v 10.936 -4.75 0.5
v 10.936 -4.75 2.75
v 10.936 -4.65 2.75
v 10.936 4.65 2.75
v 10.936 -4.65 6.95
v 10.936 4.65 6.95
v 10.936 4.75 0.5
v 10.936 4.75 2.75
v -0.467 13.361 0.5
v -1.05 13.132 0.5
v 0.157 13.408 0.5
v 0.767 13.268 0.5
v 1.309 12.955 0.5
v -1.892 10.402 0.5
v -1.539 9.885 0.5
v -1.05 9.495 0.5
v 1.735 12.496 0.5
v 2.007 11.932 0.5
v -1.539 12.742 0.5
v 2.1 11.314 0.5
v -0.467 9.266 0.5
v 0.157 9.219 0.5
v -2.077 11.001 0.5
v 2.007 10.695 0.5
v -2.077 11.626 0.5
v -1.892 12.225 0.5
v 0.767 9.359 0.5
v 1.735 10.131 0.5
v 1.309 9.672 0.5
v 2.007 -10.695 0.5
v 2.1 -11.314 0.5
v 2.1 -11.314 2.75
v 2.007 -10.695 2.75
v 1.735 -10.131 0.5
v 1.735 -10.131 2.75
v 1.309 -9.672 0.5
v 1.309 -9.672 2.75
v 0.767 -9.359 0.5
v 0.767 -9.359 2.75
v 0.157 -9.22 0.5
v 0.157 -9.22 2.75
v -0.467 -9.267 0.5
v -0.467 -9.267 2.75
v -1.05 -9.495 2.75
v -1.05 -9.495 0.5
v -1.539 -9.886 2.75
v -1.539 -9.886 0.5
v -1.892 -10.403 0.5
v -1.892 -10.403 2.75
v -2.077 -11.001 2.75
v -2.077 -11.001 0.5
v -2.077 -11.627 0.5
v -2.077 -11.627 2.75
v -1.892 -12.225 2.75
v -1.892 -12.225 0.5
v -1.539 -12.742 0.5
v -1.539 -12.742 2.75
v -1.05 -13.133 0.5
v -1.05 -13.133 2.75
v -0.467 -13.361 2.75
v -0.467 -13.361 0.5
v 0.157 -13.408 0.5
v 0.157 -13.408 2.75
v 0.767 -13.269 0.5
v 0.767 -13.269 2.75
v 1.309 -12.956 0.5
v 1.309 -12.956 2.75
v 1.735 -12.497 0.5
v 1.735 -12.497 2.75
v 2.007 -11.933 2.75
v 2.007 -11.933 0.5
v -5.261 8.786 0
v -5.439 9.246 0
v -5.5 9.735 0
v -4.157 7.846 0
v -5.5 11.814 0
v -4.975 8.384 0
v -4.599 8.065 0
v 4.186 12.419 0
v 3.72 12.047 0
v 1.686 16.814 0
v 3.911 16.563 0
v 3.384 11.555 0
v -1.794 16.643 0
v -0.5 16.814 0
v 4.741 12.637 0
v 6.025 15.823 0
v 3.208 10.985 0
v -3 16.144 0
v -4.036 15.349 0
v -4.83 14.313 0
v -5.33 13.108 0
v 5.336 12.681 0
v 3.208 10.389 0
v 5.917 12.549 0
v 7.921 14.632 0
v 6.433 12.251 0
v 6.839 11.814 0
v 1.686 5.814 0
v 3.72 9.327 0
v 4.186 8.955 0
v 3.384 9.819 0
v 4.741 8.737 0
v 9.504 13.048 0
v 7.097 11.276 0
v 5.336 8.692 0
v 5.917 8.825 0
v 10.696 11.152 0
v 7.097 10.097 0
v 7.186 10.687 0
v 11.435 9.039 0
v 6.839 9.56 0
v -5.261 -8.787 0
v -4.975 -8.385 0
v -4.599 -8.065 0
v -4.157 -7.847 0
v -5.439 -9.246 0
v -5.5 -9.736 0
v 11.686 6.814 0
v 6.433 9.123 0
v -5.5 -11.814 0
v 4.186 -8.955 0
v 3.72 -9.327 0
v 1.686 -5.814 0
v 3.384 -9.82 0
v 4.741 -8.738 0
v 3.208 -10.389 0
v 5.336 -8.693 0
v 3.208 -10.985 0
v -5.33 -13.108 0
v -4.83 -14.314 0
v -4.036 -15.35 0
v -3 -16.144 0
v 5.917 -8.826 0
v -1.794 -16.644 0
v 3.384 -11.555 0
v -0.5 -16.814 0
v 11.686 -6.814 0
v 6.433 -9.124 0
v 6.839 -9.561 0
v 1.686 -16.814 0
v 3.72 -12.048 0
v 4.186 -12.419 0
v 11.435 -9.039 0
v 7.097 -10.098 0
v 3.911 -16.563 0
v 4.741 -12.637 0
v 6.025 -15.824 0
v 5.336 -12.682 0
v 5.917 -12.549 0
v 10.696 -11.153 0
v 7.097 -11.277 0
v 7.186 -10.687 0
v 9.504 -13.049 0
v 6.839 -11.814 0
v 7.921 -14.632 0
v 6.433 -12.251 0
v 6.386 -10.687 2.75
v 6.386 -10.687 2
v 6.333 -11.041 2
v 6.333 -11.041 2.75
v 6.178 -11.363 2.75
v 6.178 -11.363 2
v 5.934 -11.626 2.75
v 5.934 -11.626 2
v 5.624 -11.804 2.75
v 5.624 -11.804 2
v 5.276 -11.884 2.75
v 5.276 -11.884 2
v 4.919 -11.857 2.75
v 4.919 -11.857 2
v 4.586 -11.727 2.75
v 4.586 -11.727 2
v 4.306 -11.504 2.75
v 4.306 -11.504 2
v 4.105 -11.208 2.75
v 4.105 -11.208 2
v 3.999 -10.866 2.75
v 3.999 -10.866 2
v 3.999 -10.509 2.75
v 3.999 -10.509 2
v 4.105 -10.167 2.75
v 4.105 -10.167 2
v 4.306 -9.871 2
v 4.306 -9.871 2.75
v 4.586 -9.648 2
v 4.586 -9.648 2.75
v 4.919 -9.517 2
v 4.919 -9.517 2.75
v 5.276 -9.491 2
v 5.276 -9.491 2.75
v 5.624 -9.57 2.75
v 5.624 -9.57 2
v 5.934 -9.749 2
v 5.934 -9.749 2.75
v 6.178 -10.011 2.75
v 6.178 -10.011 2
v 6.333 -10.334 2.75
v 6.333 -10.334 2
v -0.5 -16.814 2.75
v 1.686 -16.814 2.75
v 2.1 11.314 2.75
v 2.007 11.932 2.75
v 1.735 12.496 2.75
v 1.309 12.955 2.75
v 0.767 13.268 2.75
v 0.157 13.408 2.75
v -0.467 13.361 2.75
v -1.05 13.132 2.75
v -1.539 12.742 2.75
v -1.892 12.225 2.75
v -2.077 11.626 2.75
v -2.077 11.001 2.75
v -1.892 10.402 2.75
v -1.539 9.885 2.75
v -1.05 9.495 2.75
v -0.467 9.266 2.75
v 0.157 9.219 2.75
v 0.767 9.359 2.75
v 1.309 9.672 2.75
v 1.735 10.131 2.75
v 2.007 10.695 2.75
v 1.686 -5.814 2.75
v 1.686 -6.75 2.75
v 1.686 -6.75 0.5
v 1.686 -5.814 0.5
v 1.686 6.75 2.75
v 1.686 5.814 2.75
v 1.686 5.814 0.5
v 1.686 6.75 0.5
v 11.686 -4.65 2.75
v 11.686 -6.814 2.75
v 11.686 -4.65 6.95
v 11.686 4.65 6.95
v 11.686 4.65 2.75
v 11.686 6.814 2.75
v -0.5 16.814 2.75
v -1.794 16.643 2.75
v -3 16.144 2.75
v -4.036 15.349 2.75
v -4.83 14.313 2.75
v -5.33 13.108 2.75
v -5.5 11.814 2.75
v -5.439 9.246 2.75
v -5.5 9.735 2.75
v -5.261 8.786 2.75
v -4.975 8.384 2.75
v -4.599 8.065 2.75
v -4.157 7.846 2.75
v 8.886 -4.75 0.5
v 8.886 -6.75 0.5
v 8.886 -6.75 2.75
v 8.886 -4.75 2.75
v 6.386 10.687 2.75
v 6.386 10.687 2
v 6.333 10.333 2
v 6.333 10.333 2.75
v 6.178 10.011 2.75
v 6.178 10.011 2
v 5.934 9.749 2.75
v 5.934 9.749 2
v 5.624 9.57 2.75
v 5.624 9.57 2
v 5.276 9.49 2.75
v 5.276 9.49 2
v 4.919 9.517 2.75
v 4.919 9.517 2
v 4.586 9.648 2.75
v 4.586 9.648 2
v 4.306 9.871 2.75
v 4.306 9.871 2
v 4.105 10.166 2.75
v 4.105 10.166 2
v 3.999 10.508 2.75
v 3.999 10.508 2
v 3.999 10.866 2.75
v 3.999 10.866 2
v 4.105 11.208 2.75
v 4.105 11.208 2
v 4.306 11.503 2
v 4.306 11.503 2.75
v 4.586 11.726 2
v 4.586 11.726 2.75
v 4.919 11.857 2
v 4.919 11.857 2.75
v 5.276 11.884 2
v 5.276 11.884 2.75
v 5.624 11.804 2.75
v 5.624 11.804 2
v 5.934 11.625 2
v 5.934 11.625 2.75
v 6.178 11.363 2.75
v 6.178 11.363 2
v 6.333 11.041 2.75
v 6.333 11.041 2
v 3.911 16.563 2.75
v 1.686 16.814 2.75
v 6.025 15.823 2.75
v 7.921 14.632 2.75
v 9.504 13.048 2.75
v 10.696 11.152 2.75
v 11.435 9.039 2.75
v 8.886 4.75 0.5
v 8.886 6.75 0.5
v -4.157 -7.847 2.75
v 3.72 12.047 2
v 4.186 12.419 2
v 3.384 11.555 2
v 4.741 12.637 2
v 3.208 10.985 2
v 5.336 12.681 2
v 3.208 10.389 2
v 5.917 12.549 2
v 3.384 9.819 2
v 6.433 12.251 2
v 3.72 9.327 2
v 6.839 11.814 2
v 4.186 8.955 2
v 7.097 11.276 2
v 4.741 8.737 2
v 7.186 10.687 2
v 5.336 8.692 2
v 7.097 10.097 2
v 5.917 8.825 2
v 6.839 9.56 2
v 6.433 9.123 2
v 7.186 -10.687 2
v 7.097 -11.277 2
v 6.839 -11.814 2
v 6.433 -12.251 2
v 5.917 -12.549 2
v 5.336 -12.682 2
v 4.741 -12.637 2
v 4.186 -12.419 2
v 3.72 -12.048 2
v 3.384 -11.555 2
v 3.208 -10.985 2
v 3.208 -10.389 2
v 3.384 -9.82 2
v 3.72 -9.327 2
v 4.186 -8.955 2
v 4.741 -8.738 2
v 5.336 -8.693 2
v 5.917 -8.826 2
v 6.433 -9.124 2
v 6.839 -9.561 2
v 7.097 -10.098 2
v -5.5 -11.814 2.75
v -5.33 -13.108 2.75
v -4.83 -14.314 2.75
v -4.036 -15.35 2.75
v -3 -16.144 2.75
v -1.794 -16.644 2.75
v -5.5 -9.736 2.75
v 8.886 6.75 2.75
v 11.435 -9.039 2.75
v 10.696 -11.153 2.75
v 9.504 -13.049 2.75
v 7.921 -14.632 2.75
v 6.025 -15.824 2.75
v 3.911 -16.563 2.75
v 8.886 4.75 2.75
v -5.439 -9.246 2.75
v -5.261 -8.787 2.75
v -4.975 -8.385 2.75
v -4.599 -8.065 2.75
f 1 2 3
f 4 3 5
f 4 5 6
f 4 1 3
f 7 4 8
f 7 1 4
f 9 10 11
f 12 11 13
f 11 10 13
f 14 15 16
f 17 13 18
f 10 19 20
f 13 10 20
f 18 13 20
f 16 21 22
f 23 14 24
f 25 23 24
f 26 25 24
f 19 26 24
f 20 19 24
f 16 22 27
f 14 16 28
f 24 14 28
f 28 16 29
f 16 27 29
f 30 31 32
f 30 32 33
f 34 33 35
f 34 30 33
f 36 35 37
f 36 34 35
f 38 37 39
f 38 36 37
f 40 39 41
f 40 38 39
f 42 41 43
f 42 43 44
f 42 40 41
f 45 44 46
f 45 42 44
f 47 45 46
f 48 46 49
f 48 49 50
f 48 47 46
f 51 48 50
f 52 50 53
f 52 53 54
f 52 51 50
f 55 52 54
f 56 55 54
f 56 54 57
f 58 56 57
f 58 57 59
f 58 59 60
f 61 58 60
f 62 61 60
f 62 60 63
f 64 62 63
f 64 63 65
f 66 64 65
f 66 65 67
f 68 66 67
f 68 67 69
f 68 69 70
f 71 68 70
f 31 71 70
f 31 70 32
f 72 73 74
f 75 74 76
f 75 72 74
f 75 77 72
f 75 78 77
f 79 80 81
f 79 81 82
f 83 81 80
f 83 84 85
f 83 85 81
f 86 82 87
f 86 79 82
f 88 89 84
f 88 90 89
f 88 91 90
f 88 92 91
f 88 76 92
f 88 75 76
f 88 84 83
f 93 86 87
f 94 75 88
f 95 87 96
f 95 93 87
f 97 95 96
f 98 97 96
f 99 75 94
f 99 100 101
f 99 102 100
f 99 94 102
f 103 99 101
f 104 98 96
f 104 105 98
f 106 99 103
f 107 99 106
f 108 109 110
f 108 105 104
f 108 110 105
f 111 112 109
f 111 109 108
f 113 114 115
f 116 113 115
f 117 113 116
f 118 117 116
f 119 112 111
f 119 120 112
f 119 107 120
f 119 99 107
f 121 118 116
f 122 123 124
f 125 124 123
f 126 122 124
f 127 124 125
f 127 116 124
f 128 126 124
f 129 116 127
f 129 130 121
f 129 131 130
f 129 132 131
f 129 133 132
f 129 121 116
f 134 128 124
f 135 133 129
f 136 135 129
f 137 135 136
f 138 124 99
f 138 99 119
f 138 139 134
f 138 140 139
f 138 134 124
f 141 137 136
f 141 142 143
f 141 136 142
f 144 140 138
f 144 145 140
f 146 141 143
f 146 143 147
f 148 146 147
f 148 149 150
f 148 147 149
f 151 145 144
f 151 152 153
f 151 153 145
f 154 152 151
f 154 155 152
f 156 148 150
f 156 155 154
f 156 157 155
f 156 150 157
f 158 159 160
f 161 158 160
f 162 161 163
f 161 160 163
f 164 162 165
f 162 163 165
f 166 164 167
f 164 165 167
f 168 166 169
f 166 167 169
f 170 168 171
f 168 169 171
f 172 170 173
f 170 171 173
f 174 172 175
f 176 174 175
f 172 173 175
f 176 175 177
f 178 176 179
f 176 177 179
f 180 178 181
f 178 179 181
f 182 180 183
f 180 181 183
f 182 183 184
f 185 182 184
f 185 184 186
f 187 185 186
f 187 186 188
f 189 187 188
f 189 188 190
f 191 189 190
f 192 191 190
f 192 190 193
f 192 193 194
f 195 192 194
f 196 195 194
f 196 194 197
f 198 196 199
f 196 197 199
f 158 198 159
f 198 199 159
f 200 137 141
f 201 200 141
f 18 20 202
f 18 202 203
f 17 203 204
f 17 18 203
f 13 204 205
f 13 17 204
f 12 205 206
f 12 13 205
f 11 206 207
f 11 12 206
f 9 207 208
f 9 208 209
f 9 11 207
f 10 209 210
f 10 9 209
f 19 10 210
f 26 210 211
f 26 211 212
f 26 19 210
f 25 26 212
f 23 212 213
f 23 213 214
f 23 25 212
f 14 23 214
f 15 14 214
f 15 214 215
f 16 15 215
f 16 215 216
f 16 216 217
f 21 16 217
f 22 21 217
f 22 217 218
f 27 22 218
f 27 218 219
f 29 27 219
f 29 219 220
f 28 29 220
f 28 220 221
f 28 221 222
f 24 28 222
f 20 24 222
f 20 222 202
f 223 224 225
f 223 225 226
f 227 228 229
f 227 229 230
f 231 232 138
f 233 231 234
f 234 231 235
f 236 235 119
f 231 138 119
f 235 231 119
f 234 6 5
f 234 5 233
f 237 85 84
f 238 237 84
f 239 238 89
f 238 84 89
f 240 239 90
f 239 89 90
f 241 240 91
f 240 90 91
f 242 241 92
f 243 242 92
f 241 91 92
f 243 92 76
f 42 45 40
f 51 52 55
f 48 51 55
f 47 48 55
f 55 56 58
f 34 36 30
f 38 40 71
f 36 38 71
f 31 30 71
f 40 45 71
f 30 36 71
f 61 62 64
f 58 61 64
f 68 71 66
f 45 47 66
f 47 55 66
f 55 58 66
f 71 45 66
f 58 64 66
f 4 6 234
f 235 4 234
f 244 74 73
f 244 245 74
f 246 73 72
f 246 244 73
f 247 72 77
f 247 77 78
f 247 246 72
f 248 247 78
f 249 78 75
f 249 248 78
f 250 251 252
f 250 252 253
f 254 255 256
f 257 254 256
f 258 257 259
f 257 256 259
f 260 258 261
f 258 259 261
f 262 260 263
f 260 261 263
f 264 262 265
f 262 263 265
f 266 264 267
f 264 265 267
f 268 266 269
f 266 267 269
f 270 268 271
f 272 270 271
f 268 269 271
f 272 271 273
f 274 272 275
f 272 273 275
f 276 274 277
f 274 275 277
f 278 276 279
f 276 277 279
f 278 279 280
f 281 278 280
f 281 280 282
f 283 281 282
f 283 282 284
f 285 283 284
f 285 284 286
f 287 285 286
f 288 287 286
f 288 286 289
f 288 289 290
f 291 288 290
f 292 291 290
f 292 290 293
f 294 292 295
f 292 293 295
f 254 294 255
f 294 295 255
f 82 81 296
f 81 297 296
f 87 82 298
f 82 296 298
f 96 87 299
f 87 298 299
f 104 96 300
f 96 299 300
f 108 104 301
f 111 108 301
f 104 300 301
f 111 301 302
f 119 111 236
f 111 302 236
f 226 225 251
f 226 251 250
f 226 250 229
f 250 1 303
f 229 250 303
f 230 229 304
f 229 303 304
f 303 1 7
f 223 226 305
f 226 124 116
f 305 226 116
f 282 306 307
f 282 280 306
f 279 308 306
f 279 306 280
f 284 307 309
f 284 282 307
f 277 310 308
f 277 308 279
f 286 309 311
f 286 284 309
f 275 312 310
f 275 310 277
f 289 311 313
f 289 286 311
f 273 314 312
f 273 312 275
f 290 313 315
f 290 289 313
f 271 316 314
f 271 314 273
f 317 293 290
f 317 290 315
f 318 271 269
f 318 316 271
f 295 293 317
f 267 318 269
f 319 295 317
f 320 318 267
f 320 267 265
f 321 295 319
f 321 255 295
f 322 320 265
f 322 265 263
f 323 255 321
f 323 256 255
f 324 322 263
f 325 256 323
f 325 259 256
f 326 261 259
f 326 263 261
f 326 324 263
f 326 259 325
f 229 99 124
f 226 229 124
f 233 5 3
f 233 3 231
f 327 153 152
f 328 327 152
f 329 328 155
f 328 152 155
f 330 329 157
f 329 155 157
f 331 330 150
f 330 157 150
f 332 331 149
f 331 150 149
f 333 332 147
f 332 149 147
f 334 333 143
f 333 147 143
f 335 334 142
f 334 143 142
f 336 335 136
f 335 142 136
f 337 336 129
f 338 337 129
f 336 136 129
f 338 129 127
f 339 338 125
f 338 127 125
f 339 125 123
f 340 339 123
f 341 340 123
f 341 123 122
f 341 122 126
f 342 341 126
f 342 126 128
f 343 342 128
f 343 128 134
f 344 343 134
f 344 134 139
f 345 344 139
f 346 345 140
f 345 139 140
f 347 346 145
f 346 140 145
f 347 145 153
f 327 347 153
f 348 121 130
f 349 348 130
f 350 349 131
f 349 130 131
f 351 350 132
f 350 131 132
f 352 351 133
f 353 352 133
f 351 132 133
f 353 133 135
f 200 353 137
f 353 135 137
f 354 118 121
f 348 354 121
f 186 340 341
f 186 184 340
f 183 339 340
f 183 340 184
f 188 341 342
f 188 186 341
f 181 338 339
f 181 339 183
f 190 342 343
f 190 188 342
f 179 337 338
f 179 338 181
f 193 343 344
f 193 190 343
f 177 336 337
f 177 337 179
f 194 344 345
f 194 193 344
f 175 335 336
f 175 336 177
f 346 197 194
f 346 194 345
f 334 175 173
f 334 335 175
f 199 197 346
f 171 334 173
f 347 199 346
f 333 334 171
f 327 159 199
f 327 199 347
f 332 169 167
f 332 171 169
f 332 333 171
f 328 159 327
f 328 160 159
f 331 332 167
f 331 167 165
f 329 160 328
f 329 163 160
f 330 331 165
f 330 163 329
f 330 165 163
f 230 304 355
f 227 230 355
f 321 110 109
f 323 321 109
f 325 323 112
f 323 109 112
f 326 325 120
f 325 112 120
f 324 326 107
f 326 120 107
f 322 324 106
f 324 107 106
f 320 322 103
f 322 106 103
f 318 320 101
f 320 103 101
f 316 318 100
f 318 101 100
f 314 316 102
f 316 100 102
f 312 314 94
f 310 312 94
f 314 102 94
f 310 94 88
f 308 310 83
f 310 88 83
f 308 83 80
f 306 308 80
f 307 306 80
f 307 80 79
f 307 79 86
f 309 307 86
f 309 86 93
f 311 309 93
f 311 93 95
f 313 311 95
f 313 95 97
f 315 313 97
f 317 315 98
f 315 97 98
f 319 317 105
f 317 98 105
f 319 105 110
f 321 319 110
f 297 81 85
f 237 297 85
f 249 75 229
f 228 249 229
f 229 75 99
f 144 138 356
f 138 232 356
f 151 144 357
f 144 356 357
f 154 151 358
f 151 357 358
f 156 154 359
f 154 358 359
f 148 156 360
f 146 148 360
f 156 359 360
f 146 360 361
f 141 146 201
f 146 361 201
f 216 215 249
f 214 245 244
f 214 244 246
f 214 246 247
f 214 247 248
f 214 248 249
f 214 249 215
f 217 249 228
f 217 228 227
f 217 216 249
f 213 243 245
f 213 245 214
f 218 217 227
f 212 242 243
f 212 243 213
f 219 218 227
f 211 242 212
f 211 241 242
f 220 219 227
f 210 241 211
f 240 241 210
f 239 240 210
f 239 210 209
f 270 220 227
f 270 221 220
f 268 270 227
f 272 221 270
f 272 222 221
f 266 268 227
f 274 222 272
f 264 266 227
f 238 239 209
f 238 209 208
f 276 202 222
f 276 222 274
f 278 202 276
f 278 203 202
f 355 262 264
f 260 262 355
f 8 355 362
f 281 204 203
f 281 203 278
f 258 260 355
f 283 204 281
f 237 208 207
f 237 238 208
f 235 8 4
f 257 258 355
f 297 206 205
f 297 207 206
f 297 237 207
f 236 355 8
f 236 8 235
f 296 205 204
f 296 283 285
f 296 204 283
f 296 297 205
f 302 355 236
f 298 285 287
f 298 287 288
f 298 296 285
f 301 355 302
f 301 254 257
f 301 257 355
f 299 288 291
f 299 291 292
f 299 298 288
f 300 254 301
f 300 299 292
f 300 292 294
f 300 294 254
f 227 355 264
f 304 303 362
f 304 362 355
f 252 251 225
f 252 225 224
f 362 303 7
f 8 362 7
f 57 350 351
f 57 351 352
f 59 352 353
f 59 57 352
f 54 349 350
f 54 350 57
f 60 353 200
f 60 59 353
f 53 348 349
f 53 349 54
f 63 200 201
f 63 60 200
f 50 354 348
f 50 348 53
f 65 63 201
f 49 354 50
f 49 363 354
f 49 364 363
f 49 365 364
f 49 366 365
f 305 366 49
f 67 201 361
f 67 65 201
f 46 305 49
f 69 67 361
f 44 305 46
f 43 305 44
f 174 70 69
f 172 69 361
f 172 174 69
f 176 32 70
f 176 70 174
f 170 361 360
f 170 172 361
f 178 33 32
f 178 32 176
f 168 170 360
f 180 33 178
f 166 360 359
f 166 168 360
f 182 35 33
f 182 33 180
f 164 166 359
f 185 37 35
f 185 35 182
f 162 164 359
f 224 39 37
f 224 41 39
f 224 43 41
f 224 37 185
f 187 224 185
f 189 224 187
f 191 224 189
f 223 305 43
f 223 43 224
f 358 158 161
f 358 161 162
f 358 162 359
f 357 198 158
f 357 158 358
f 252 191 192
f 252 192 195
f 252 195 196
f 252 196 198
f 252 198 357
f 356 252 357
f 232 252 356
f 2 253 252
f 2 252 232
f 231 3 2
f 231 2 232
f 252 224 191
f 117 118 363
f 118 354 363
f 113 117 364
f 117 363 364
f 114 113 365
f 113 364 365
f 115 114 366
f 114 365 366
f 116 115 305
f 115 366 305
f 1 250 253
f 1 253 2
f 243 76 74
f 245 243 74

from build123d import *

# Parameters (mm, degrees)
F0_R      = 2.1
F1_DEPTH  = 2.75
F2_W      = 13.5
F2_H      = 2.25
F3_DEPTH  = 10
F4_W      = 2.8
F4_H      = 2
F5_DEPTH  = 2.25
F6_R      = 10
F7_R      = 2
F8_R      = 2
F9_DEPTH  = 2
F10_R     = 1.2
F11_R     = 1.2
F12_DEPTH = 0.75
F13_W     = 0.75
F13_H     = 9.5
F14_DEPTH = 2.25
F15_W     = 0.75
F15_H     = 9.5
F16_DEPTH = 4.2
F17_R     = 2.1
F18_DEPTH = 0.5
F19_W     = 0.75
F19_H     = 0.1
F20_DEPTH = 4.2


with BuildPart() as f1:
    # F0 (on Top) → F1 (new body)
    with BuildSketch(Plane.XY):
        with BuildLine():
            Line((11.6860830059, 16.8135), (5.5, 16.8135))
            Line((5.5, 16.8135), (-0.5, 16.8135))
            ThreePointArc((-0.5, 16.8135), (-4.0355339059, 15.3490339059), (-5.5, 11.8135))
            Line((-5.5, 11.8135), (-5.5, 8.3135))
            Line((-5.5, 8.3135), (1.6860830059, 5.8135))
            Line((1.6860830059, 5.8135), (1.6860830059, -5.814))
            Line((1.6860830059, -5.814), (-5.5, -8.314))
            Line((-5.5, -8.314), (-5.5, -11.814))
            ThreePointArc((-5.5, -11.814), (-4.0355339059, -15.3495339059), (-0.5, -16.814))
            Line((-0.5, -16.814), (5.5, -16.814))
            Line((5.5, -16.814), (11.6860830059, -16.814))
            Line((11.6860830059, -16.814), (11.6860830059, 16.8135))
        make_face()
        with Locations((0, -11.314)):
            Circle(F0_R, mode=Mode.SUBTRACT)
        with Locations((0, 11.3135)):
            Circle(F0_R, mode=Mode.SUBTRACT)
    extrude(amount=F1_DEPTH)

    # F2 (on face) → F3 (cut, through all)
    with BuildSketch(Plane.YZ.offset(11.6860830059)):
        with Locations((0, 1.625)):
            Rectangle(F2_W, F2_H)
    extrude(amount=-F3_DEPTH, mode=Mode.SUBTRACT)

    # F4 (on face) → F5 (join, through all)
    with BuildSketch(Plane.XY.offset(0.5)):
        with Locations((10.2860830059, -5.75)):
            Rectangle(F4_W, F4_H)
        with Locations((10.2860830059, 5.75)):
            Rectangle(F4_W, F4_H)
    extrude(amount=F5_DEPTH)

    # F6
    f6_edges = [f1.edges().sort_by_distance(p)[0] for p in [
        (11.686083, -16.814, 1.375),
        (11.686083, 16.8135, 1.375),
    ]]
    fillet(f6_edges, radius=F6_R)

    # F7
    f7_edges = [f1.edges().sort_by_distance(p)[0] for p in [
        (-5.5, -8.314, 1.375),
        (-5.5, 8.3135, 1.375),
    ]]
    fillet(f7_edges, radius=F7_R)

    # F8 (on face) → F9 (cut)
    with BuildSketch(Plane(origin=(0, 0, 0), x_dir=(1, 0, 0), z_dir=(0, 0, -1))):
        with Locations((5.1860830059, -10.6868971724)):
            Circle(F8_R)
        with Locations((5.1860830059, 10.6873971724)):
            Circle(F8_R)
    extrude(amount=-F9_DEPTH, mode=Mode.SUBTRACT)

    # F10 (on face) + F11 (on face) → F12 (cut, through all)
    with BuildSketch(Plane(origin=(0, 0, 2), x_dir=(1, 0, 0), z_dir=(0, 0, -1))):
        with Locations((5.1860830059, -10.6868971724)):
            Circle(F10_R)
    with BuildSketch(Plane(origin=(0, 0, 2), x_dir=(1, 0, 0), z_dir=(0, 0, -1))):
        with Locations((5.1860830059, 10.6873971724)):
            Circle(F11_R)
    extrude(amount=-F12_DEPTH, mode=Mode.SUBTRACT)

    # F13 (on face) → F14 (join, through all)
    with BuildSketch(Plane.XY.offset(0.5)):
        with Locations((11.3110830059, 0)):
            Rectangle(F13_W, F13_H)
    extrude(amount=F14_DEPTH)

    # F15 (on face) → F16 (join)
    with BuildSketch(Plane.XY.offset(2.75)):
        with Locations((11.3110830059, 0)):
            Rectangle(F15_W, F15_H)
    extrude(amount=F16_DEPTH)

    # F17 (on face) → F18 (join)
    with BuildSketch(Plane(origin=(0, 0, 0), x_dir=(1, 0, 0), z_dir=(0, 0, -1))):
        with Locations((0, 11.314)):
            Circle(F17_R)
        with Locations((0, -11.3135)):
            Circle(F17_R)
    extrude(amount=-F18_DEPTH)

    # F19 (on face) → F20 (cut, through all)
    with BuildSketch(Plane.XY.offset(6.95)):
        with Locations((11.3110830059, 4.7)):
            Rectangle(F19_W, F19_H)
        with Locations((11.3110830059, -4.7)):
            Rectangle(F19_W, F19_H)
    extrude(amount=-F20_DEPTH, mode=Mode.SUBTRACT)


solid = f1.part
